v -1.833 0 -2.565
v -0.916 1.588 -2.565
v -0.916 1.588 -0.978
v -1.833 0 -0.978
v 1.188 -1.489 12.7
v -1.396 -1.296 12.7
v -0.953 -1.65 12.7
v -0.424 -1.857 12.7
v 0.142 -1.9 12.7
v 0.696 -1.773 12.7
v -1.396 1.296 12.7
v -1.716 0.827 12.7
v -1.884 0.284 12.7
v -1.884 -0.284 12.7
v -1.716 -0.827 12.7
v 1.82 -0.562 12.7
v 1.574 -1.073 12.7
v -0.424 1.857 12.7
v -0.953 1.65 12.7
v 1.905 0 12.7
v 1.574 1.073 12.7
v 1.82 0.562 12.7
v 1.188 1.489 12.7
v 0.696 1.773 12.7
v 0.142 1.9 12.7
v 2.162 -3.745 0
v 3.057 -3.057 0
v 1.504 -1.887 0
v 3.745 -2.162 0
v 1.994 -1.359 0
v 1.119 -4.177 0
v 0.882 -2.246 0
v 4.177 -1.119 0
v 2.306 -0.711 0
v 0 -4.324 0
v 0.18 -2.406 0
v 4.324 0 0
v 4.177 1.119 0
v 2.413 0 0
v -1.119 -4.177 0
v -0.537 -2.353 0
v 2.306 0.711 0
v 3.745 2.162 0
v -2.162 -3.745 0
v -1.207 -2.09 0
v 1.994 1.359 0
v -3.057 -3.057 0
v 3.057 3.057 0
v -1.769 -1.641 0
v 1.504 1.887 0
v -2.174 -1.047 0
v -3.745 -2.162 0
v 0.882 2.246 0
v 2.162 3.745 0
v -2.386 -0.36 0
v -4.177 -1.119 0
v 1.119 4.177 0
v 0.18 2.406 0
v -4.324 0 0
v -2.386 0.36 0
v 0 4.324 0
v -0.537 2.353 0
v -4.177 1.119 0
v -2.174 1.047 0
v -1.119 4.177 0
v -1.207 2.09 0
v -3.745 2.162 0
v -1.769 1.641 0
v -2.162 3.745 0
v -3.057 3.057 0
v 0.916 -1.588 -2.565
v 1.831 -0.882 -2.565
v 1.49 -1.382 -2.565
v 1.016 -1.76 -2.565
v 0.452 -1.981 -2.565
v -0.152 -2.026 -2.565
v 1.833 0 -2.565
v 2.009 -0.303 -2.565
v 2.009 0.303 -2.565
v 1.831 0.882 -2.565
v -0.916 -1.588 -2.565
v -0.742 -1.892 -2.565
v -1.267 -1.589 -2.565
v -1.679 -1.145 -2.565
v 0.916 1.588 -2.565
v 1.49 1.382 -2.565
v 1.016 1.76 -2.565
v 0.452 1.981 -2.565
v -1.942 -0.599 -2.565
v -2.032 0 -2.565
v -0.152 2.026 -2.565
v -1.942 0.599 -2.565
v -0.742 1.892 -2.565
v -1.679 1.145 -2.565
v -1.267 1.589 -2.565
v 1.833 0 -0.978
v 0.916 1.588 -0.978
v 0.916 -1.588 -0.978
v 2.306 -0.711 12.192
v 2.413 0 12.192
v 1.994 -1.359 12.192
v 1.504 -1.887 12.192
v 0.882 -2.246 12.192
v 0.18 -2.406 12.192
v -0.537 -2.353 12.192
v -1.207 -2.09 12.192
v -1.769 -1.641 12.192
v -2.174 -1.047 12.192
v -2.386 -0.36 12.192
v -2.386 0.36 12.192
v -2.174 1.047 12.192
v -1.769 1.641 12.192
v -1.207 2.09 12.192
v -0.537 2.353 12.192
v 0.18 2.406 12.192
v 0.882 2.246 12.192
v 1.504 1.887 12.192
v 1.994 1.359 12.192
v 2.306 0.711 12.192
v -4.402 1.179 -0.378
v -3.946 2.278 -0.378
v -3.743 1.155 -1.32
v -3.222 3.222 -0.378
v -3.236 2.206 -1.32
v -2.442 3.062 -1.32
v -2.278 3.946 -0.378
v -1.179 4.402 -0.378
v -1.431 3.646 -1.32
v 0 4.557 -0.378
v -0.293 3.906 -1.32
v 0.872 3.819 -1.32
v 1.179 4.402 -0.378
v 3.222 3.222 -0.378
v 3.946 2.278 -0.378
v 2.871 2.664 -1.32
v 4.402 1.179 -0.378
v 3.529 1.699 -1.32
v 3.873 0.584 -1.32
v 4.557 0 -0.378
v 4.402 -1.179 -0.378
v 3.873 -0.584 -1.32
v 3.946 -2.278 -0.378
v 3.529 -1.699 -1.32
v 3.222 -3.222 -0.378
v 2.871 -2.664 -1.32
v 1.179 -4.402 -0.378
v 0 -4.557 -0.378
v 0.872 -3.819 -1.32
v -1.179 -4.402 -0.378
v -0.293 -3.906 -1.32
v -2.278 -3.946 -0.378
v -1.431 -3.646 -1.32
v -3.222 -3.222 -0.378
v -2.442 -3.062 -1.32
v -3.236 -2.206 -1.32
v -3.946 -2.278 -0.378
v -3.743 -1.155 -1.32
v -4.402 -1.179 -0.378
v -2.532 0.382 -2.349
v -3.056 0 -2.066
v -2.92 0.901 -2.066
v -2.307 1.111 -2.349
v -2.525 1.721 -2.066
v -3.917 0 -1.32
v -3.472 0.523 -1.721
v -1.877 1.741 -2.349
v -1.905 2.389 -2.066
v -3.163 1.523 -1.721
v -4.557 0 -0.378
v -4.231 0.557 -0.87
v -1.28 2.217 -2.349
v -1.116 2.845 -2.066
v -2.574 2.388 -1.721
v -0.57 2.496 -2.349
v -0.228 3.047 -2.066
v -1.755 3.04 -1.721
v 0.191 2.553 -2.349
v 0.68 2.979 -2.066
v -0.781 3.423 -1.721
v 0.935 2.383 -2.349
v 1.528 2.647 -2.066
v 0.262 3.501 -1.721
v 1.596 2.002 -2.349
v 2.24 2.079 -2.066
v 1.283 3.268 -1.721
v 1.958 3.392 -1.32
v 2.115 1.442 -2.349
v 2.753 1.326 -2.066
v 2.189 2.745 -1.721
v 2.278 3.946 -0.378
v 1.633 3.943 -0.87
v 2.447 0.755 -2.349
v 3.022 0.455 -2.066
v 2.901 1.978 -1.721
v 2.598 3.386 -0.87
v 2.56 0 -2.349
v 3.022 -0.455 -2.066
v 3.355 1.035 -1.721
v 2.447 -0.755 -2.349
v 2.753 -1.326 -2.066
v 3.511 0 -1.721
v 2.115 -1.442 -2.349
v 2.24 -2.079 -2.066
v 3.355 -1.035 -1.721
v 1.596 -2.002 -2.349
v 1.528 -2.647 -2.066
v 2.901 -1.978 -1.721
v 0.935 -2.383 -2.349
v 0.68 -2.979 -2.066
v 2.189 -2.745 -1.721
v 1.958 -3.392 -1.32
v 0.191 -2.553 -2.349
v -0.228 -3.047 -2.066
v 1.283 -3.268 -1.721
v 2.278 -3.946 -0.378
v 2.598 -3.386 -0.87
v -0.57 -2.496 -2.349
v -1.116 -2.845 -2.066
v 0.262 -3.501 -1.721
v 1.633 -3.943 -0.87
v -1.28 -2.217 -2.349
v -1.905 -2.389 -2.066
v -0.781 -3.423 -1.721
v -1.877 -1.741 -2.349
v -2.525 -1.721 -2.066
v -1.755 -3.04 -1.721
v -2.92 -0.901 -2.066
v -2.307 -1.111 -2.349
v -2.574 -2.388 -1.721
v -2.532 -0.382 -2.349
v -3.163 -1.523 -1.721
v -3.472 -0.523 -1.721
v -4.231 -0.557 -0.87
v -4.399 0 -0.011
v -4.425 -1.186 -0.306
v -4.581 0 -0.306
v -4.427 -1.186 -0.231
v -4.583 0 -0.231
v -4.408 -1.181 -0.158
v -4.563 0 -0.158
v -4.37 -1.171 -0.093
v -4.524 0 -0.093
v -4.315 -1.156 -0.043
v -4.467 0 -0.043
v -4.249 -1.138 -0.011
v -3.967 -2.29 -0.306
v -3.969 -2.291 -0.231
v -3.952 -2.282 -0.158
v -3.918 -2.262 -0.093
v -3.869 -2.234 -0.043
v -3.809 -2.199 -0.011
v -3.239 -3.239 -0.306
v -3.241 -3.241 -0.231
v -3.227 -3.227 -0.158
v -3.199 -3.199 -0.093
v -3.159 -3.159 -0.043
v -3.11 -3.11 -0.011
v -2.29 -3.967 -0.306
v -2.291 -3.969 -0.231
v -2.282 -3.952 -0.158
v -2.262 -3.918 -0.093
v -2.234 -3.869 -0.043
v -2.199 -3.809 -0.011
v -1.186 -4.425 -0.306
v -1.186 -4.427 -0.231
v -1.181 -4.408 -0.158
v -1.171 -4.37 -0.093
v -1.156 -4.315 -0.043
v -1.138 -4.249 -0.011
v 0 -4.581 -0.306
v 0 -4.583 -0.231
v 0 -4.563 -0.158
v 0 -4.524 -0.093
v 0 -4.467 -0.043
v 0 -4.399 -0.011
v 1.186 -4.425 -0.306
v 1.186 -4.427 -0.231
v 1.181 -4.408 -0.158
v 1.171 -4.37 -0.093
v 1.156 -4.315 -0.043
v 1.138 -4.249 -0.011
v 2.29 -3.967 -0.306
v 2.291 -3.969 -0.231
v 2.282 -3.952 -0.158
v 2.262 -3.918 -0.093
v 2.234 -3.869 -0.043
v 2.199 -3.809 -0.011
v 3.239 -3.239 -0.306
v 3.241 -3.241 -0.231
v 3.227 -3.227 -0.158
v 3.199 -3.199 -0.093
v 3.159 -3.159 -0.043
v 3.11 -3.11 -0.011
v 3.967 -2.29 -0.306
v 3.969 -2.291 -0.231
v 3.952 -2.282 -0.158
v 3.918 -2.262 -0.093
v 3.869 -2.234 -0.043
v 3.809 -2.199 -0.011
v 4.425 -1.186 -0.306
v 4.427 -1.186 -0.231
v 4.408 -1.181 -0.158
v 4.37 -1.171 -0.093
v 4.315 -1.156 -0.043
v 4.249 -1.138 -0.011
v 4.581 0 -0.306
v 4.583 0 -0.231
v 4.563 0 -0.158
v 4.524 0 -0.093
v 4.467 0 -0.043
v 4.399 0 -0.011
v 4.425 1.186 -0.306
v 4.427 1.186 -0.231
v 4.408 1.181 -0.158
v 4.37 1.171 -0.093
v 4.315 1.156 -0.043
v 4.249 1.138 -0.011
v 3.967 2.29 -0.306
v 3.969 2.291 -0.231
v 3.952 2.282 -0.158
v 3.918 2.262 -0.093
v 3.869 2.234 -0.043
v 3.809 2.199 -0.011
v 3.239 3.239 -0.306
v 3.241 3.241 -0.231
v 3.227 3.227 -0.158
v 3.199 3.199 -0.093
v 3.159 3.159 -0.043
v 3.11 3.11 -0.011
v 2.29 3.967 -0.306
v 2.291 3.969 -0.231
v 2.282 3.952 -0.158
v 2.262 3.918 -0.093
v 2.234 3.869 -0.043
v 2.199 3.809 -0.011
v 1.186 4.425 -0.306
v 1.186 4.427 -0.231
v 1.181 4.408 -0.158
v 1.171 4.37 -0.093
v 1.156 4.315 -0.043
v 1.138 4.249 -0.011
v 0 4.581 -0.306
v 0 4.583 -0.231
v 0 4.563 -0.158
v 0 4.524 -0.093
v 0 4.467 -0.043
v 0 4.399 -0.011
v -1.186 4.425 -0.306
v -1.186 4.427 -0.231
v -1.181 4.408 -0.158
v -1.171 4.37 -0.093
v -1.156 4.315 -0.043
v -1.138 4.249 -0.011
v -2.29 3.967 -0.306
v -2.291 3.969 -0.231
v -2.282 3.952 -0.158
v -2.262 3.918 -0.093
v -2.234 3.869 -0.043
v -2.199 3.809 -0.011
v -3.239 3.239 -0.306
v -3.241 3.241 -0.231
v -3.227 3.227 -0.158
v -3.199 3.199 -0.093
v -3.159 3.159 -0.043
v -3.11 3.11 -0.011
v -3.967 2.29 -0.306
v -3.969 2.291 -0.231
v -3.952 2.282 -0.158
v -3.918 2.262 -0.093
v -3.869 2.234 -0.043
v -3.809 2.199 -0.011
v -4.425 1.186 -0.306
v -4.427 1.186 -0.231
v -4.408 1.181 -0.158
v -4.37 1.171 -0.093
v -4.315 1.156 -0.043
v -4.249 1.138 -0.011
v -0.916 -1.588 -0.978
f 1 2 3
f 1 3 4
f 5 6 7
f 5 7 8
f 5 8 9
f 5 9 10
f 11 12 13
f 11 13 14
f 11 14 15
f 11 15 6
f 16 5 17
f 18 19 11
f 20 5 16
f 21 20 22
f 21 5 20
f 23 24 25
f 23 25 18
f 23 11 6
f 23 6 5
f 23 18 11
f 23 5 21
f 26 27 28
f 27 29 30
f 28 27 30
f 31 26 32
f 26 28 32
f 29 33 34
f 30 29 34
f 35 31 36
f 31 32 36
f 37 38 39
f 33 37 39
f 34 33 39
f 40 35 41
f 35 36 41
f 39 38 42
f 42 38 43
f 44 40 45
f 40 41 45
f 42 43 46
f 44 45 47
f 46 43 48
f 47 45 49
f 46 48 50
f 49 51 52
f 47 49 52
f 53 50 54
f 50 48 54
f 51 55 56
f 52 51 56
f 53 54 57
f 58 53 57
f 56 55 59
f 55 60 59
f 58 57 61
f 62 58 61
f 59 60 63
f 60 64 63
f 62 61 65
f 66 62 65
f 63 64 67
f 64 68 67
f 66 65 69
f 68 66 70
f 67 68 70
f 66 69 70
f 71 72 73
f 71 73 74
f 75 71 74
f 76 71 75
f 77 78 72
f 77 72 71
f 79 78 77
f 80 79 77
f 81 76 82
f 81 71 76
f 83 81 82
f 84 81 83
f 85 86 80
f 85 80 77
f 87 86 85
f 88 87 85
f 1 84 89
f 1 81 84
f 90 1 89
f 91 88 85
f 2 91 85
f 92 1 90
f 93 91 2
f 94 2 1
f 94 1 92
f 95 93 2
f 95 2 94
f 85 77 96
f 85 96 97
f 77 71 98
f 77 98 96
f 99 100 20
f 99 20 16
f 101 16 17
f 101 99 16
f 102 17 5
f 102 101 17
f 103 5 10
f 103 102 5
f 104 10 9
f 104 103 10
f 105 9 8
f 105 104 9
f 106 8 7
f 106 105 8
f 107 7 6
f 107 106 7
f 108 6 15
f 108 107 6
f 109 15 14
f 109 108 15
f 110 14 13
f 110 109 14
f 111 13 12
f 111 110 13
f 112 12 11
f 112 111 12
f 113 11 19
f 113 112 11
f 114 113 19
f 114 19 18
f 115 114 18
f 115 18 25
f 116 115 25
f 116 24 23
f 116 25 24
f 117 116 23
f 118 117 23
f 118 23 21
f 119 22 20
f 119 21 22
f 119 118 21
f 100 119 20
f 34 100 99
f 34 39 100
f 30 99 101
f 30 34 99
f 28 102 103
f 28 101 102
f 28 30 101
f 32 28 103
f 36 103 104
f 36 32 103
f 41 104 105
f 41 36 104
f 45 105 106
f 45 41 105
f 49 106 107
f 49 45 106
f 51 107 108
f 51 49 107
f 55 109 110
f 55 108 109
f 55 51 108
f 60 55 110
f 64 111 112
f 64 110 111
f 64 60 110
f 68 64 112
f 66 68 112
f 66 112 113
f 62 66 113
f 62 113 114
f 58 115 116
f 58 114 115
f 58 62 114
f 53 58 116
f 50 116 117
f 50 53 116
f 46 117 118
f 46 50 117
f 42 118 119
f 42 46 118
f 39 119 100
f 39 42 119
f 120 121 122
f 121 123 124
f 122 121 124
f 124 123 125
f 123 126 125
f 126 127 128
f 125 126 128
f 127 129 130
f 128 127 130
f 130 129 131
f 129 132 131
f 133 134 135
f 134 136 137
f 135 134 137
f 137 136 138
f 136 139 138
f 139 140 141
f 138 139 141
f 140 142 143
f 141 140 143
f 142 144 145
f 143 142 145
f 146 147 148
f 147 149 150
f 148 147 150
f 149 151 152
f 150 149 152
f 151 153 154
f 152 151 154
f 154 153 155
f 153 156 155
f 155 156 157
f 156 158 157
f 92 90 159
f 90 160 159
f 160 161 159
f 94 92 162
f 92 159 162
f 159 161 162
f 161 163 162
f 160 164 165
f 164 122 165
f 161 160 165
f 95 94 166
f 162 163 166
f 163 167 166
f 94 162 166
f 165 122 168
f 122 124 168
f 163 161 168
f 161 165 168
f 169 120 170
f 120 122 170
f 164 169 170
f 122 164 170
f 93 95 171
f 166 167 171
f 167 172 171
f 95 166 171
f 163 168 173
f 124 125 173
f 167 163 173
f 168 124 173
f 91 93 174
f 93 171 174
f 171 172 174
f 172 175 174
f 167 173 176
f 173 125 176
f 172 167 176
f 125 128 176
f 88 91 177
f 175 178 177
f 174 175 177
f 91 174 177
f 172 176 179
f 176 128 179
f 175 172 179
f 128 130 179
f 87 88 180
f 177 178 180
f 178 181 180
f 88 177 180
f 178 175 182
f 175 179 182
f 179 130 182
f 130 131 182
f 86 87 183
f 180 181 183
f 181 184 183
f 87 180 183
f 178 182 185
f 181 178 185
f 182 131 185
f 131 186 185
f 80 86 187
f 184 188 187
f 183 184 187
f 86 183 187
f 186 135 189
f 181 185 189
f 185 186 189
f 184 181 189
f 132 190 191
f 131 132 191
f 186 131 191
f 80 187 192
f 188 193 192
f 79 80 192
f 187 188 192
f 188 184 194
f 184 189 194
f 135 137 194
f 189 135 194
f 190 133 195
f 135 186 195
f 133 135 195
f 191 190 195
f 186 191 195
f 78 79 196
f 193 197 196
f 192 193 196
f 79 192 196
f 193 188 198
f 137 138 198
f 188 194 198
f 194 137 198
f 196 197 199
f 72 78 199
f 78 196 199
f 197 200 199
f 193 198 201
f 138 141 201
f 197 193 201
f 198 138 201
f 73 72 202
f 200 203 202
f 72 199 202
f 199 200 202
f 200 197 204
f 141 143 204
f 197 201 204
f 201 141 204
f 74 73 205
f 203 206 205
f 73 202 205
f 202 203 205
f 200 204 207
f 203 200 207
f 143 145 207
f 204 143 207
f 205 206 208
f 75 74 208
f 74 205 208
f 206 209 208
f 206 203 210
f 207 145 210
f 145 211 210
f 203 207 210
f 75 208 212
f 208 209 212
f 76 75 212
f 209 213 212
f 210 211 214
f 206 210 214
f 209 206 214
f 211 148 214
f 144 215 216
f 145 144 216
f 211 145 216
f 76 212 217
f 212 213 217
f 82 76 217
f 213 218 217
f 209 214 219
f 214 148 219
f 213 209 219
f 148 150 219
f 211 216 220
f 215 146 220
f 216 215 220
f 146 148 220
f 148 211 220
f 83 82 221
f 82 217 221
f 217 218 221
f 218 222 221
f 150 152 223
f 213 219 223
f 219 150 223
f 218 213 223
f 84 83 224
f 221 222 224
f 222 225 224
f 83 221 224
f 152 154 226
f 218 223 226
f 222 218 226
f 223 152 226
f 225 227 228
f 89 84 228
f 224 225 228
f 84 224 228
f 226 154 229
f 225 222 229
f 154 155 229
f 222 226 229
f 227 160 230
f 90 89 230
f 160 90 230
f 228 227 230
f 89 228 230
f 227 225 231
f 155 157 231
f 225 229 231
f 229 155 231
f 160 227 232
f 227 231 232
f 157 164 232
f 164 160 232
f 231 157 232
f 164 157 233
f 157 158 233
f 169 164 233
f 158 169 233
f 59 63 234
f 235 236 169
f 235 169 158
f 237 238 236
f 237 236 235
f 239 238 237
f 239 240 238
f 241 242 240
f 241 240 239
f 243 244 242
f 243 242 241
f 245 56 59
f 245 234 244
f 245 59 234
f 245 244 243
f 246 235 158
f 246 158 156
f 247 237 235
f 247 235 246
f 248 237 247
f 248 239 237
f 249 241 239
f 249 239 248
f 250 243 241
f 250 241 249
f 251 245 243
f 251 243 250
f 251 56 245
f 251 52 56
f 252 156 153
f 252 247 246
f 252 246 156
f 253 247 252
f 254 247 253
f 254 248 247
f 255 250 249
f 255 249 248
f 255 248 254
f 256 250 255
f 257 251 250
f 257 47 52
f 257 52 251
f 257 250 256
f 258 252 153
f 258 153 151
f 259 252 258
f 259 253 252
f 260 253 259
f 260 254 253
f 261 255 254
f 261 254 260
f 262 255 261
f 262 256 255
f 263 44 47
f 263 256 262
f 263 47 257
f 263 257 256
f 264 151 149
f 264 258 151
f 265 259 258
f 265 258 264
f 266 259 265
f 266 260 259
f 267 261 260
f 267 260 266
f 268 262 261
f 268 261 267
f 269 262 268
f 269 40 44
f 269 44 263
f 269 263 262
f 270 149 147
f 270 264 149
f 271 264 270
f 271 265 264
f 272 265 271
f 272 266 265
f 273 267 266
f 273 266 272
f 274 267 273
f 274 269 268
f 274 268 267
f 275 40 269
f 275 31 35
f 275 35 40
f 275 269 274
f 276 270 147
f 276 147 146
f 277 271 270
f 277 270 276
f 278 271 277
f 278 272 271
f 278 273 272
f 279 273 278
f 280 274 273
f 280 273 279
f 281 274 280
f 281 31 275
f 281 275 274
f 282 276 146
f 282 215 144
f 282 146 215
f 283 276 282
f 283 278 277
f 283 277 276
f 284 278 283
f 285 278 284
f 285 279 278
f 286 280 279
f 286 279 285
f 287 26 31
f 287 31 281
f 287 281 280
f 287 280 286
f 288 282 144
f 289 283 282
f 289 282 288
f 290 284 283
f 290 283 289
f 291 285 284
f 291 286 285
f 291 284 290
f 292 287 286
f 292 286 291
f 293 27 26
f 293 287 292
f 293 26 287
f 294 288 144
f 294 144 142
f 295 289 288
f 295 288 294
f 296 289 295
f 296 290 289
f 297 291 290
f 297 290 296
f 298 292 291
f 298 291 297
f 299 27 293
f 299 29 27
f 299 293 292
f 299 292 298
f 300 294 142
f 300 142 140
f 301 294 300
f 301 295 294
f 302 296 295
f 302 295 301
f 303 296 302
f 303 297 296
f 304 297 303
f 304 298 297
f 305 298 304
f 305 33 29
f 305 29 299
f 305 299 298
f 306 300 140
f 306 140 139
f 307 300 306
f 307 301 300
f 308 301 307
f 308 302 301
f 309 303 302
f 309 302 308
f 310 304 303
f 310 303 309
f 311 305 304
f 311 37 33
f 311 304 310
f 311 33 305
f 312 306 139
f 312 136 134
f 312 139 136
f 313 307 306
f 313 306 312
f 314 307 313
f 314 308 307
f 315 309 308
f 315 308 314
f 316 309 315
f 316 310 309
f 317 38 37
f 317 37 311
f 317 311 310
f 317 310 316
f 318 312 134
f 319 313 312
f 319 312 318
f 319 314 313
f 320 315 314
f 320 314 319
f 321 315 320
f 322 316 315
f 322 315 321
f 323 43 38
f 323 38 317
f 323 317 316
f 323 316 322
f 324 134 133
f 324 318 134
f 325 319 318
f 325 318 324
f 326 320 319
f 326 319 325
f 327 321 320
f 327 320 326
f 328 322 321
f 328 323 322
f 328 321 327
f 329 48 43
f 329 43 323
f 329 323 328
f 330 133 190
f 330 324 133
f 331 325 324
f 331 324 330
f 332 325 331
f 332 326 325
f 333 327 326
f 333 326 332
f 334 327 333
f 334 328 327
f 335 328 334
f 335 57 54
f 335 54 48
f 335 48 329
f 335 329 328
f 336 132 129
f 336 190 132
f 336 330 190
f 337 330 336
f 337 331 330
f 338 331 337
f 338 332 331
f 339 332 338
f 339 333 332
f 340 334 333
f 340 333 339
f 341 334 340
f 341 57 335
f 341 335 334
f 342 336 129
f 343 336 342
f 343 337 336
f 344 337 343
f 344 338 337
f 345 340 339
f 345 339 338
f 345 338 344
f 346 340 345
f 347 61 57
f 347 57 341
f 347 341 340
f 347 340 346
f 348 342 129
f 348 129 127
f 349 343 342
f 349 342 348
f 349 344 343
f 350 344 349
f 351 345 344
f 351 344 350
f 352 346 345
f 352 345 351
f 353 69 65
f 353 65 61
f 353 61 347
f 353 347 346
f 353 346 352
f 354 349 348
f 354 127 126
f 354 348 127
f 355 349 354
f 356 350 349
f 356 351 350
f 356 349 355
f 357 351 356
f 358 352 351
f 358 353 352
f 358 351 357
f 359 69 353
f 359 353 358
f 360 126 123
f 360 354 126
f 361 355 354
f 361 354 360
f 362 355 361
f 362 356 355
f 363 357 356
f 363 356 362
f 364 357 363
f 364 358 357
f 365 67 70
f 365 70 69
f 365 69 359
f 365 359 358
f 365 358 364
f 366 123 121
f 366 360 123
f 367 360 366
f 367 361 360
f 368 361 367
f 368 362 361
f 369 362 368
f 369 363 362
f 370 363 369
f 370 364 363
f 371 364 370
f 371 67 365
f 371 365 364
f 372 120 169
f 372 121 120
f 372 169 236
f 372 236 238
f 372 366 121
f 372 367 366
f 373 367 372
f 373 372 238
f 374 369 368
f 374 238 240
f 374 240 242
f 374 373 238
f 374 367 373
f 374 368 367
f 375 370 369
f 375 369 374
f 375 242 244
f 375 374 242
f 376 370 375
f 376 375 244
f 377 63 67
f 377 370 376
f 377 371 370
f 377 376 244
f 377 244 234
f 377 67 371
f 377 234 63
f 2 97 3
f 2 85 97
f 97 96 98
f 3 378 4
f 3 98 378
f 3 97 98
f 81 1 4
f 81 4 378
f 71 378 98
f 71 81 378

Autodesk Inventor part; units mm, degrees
ref_plane "YZ Plane" through (0, 0, 0) normal (1, 0, 0) x (0, 1, 0)
ref_plane "XZ Plane" through (0, 0, 0) normal (0, 1, 0) x (-1, 0, 0)
ref_plane "XY Plane" through (0, 0, 0) normal (0, 0, 1) x (1, 0, 0)
sketch "Sketch1" plane through (0, 0, 0) normal (0, 0, 1) x (1, 0, 0)
  circle A0 centre (0, 0) radius 2.413
  dimension "d0" = 4.826
extrude "Extrusion1" add sketch "Sketch1" along normal blind 12.7
sketch "Sketch2" plane through (0, 0, 0) normal (0, 1, 0) x (-1, 0, 0)
  line L0 (0, 0) -> (0, -2.5654)
  line L1 (0, 0) -> (4.3239, 0)
  line L2 (0, -2.5654) -> (2.032, -2.5654)
  line L3 (4.3239, 0) -> (4.3239, 3.8864) construction
  arc A0 (4.5568, -0.3781) -> (4.3239, 0) centre (4.3239, -0.2608) ccw
  arc A1 (2.032, -2.5654) -> (4.5568, -0.3781) centre (0.6382, 1.5944) ccw
  line L4 (4.5847, 0.6553) -> (4.5847, -0.2608) construction
  dimension "d3" = 2.5654
  dimension "d6" = 2.032
  dimension "d12" = 4.5847
revolve "Revolution1" add sketch "Sketch2" angle 360 about axis through (0, 0, 0) along (0, 0, -1)
sketch "Sketch3" plane through (0, 0, -2.5654) normal (0, 0, -1) x (-1, 0, 0)
  circle A0 centre (0, 0) radius 2.032 projected
  line L0 (-0.9165, 1.5875) -> (0.9165, 1.5875)
  line L1 (0.9165, 1.5875) -> (1.8331, 0)
  line L2 (1.8331, 0) -> (0.9165, -1.5875)
  line L3 (0.9165, -1.5875) -> (-0.9165, -1.5875)
  line L4 (-0.9165, -1.5875) -> (-1.8331, 0)
  line L5 (-1.8331, 0) -> (-0.9165, 1.5875)
  dimension "d8" = 3.175
extrude "Extrusion2" cut sketch "Sketch3" against normal blind 1.5875 contours L0 L1 L2 L3 L4 L5
chamfer "Chamfer1" distance 0.508 angle 45 1 edges at (-2.413, 0, 12.7)
thread "Thread1" size "10-32 UNF" class "2A" standard "ANSI Unified Screw Threads" full length
properties part number "10-32 x500 button head" material "Steel"
